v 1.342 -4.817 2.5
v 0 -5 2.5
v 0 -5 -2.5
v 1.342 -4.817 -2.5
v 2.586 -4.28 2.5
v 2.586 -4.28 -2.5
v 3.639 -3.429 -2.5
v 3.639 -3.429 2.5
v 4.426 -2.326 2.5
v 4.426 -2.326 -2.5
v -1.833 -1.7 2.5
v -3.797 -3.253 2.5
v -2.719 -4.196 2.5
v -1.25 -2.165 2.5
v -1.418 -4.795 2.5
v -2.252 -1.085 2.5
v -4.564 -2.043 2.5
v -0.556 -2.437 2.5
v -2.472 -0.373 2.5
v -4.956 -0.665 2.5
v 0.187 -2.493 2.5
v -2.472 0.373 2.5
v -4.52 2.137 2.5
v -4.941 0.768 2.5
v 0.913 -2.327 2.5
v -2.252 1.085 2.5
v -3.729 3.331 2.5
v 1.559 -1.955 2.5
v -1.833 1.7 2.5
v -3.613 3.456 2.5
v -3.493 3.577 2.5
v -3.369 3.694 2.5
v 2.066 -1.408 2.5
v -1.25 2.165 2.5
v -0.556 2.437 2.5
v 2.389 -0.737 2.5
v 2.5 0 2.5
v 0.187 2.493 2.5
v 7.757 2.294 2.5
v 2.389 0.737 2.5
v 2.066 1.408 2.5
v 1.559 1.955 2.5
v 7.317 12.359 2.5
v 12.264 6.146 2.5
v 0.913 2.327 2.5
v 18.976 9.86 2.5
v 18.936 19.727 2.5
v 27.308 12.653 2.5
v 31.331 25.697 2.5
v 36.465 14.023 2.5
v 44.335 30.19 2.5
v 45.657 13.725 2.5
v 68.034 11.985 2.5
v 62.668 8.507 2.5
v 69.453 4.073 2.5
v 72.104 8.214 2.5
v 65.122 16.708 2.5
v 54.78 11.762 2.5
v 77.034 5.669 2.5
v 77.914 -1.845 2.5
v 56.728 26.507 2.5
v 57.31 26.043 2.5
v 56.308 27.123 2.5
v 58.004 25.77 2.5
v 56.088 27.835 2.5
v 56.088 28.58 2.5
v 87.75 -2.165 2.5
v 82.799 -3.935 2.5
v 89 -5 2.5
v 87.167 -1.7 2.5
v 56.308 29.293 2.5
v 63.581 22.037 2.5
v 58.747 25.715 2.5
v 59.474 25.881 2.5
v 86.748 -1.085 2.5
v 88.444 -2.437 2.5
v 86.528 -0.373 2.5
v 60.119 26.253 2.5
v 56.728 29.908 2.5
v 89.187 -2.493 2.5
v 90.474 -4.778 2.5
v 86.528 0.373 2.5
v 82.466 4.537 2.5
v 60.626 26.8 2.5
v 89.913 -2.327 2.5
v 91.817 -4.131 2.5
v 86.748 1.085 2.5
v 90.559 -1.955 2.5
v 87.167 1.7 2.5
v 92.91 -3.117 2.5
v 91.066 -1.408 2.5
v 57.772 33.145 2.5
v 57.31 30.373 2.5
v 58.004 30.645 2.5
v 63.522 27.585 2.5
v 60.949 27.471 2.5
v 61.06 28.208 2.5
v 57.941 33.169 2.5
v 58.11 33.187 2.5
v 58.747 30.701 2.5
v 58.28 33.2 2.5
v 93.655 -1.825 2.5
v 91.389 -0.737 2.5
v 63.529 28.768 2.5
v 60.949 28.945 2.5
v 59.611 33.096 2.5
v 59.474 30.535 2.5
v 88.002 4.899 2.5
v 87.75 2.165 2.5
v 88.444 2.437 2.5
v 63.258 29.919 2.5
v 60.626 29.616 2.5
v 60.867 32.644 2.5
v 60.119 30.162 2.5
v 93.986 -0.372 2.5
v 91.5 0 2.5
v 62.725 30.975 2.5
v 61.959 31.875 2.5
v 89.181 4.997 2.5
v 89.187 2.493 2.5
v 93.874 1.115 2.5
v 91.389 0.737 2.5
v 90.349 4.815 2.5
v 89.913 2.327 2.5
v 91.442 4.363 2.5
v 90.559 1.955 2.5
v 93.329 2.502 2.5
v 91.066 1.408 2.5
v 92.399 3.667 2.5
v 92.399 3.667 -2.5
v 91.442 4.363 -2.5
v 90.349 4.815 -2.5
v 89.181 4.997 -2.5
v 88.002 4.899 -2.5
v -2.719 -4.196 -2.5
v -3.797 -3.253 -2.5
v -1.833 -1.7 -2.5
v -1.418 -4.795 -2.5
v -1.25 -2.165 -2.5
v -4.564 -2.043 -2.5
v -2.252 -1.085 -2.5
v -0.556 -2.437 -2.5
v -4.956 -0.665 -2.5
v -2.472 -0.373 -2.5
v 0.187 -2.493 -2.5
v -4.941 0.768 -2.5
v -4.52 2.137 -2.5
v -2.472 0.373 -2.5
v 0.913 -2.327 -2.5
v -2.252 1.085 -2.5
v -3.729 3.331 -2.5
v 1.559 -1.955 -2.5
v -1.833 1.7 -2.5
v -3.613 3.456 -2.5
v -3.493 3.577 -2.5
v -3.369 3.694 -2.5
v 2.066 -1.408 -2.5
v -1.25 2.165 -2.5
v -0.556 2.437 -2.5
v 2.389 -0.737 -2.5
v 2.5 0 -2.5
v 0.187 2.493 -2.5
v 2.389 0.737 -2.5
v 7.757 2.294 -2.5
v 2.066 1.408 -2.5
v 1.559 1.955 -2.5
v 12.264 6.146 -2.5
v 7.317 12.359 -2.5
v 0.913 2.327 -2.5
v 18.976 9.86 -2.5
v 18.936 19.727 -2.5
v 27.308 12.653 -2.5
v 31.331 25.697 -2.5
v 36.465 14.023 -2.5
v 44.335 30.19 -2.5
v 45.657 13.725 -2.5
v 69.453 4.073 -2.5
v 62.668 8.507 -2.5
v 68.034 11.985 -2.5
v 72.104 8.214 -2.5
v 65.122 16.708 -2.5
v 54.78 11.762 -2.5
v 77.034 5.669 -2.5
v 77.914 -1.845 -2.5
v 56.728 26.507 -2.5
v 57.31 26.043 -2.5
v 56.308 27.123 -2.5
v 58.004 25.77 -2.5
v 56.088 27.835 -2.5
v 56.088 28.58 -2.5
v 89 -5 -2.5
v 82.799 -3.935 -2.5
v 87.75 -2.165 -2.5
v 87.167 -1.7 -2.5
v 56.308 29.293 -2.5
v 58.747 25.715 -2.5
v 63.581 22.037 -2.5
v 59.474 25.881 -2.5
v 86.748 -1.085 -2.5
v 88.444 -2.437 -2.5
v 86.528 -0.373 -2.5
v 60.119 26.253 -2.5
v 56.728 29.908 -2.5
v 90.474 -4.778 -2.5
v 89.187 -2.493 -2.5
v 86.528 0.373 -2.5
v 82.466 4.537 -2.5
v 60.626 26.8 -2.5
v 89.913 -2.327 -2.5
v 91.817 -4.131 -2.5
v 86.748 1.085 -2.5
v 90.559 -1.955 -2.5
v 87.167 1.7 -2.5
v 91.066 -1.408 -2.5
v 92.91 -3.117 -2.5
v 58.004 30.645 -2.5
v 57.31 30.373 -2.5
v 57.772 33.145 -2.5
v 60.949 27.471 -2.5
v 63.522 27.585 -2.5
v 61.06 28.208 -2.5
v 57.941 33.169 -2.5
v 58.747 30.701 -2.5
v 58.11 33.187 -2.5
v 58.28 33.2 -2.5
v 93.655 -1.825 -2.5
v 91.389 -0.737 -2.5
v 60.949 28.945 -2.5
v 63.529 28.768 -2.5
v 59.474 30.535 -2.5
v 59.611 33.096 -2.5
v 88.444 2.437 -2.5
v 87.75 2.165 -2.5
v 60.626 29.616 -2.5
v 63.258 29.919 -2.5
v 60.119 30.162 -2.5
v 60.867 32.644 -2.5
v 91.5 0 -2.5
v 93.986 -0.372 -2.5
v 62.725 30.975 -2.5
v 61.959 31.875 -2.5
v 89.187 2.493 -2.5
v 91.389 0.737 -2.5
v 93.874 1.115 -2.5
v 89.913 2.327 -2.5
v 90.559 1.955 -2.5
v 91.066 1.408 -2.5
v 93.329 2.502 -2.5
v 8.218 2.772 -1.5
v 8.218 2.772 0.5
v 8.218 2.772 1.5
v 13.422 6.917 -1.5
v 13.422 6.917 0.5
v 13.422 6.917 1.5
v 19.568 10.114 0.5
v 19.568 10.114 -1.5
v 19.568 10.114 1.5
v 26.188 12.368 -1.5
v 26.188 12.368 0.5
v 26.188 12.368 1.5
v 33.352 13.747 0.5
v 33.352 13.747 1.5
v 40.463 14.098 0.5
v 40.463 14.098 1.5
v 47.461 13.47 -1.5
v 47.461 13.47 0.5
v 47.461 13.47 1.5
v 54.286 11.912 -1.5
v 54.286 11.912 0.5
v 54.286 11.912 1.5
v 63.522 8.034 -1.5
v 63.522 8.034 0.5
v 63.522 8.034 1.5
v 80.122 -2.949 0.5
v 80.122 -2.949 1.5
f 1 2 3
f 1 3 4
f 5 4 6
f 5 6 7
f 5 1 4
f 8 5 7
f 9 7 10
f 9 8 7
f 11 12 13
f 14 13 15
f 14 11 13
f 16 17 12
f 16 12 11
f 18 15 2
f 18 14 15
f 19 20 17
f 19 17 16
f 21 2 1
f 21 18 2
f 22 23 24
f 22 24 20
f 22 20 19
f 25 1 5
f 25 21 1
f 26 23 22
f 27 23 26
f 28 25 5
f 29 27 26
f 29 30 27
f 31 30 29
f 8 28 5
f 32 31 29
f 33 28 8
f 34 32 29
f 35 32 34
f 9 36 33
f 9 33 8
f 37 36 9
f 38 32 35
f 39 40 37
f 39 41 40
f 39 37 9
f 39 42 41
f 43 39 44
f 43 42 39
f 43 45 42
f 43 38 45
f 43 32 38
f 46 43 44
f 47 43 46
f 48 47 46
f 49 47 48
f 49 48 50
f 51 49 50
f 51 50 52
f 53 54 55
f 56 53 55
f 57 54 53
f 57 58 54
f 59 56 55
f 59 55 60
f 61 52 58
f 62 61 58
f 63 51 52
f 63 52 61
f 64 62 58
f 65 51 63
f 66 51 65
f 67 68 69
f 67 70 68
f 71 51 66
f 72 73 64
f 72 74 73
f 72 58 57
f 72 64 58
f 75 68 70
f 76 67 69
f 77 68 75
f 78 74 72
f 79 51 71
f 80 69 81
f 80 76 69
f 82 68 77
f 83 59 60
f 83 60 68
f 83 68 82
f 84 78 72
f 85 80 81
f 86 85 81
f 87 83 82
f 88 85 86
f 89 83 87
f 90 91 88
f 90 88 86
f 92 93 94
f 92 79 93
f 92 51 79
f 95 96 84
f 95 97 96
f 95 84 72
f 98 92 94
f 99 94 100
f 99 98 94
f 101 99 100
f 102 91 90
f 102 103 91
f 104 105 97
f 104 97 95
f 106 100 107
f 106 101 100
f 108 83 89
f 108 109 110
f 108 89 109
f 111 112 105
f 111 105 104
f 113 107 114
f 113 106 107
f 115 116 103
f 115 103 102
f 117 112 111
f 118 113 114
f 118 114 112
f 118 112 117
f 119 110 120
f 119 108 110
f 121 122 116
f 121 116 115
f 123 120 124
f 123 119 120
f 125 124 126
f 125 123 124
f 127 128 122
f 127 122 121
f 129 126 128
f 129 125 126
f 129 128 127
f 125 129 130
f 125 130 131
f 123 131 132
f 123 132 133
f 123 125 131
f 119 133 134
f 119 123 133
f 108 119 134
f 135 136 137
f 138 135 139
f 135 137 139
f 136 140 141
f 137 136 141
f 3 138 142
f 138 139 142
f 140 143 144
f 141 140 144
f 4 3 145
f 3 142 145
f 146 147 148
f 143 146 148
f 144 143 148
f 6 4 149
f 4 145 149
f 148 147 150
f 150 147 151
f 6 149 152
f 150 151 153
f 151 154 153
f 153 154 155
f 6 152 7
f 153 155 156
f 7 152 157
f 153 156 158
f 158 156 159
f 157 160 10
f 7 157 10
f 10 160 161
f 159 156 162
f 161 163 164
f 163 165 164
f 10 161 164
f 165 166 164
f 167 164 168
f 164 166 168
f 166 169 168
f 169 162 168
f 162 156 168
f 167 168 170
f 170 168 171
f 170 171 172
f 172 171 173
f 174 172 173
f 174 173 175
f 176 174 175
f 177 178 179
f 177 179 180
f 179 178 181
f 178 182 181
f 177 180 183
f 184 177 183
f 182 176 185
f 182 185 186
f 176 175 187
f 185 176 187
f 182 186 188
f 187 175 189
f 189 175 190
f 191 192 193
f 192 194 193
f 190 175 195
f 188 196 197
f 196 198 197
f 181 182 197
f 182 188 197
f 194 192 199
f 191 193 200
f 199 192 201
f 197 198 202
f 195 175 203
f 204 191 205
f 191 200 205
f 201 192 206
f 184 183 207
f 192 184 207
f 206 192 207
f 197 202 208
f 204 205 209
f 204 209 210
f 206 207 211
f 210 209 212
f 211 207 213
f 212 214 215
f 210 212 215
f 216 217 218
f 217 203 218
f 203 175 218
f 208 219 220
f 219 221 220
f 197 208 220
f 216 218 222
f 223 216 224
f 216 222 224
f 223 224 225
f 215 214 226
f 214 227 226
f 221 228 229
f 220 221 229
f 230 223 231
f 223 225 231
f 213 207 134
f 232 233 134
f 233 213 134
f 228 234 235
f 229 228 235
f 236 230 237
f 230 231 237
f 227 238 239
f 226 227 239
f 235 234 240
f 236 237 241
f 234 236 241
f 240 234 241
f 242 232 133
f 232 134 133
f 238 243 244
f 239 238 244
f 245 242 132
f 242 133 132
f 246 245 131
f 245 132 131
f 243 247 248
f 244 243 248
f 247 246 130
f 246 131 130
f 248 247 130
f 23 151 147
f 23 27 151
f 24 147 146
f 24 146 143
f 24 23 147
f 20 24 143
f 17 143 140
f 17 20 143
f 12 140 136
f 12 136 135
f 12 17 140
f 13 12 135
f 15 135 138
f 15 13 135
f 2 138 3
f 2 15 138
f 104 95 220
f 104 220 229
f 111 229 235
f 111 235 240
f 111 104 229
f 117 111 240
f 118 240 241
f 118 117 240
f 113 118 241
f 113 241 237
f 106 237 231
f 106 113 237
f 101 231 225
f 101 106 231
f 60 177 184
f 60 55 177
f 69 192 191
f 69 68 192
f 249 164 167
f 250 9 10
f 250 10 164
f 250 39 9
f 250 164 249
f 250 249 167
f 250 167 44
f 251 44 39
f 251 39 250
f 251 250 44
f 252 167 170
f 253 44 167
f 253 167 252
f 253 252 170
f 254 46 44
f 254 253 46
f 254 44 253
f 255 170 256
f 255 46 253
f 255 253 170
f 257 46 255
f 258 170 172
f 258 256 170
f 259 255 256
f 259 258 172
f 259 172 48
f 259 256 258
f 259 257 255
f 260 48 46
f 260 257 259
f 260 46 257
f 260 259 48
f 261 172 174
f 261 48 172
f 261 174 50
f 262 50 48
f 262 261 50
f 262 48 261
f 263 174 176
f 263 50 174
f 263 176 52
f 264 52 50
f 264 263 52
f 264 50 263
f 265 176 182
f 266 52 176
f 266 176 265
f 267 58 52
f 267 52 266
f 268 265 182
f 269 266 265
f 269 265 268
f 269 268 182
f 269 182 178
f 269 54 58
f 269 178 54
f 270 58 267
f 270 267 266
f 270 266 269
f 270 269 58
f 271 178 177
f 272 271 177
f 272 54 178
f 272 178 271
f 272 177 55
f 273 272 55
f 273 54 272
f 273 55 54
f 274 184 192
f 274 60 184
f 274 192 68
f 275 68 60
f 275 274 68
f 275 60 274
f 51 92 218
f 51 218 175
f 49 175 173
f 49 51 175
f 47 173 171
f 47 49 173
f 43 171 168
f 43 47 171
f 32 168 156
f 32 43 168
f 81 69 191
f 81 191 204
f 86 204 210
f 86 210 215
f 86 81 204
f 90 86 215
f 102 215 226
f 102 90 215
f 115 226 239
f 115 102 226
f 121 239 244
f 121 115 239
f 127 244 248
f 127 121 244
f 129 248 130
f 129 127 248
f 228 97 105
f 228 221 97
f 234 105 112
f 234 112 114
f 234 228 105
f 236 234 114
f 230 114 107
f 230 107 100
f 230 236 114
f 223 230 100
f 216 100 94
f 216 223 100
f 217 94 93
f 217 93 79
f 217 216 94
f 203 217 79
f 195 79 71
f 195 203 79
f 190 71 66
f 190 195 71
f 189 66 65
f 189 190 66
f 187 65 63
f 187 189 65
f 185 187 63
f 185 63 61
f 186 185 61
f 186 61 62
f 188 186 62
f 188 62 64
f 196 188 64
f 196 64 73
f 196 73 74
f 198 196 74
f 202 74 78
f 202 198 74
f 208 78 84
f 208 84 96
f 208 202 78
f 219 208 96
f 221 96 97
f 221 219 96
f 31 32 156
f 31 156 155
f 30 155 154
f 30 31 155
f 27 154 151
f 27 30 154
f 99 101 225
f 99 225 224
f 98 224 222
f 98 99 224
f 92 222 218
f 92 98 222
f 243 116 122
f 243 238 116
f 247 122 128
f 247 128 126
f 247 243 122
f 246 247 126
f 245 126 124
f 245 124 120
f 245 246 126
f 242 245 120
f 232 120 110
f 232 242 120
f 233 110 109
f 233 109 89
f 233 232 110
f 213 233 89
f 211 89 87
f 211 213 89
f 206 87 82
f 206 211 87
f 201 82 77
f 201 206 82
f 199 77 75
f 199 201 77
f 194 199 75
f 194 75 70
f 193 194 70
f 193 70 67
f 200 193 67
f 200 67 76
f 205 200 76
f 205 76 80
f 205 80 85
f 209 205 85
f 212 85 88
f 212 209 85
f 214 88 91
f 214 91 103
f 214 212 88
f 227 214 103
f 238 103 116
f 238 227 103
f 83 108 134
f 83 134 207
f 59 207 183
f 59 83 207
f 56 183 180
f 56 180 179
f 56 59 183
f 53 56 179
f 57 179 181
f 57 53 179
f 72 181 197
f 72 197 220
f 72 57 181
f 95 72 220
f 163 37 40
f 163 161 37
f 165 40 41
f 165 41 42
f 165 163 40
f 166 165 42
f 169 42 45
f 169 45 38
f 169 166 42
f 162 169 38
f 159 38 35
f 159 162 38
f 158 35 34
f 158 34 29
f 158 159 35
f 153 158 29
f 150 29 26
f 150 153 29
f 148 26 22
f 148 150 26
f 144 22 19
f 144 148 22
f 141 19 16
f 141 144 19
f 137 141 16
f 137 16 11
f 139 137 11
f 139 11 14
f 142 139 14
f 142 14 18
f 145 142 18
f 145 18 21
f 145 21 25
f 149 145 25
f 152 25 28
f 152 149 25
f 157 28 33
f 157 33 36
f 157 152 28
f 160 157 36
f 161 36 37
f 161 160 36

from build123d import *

# Parameters (mm, degrees)
SKETCH_1_R          = 2.5
EXTRUDE_1_DEPTH     = 2.5
SKETCH_2_OUTSIDE_W  = 122.246
SKETCH_2_OUTSIDE_H  = 61.454
CUT_EXTRUDE_1_DEPTH = 5


with BuildPart() as part:
    # 草圖1 → 填料-伸長1 (new body, symmetric)
    with BuildSketch(Plane.XY):
        with BuildLine():
            Line((0, -5), (89, -5))
            ThreePointArc((89, -5), (93.65494965, -1.825224302), (92.398530891, 3.667422499))
            Line((92.398530891, 3.667422499), (61.958924149, 31.87522889))
            ThreePointArc((61.958924149, 31.87522889), (60.254323258, 32.912123681), (58.279993488, 33.199937797))
            ThreePointArc((58.279993488, 33.199937797), (24.304322989, 24.433991013), (-3.728789315, 3.331085445))
            ThreePointArc((-3.728789315, 3.331085445), (-4.563738995, -2.042617533), (0, -5))
        make_face()
        with Locations((89, 0)):
            Circle(SKETCH_1_R, mode=Mode.SUBTRACT)
        with Locations((58.560393258, 28.207806391)):
            Circle(SKETCH_1_R, mode=Mode.SUBTRACT)
        Circle(SKETCH_1_R, mode=Mode.SUBTRACT)
    extrude(amount=EXTRUDE_1_DEPTH, both=True)

    # 草圖2 outside → 除料-伸長1 (cut)
    with BuildSketch(Plane.XY.offset(2.5)):
        with Locations((44.5, 14.104)):
            Rectangle(SKETCH_2_OUTSIDE_W, SKETCH_2_OUTSIDE_H)
        with BuildLine():
            ThreePointArc((89, -5), (93.974802144, 0.501341826), (88.002369443, 4.899462549))
            ThreePointArc((88.002369443, 4.899462549), (69.941203596, 9.961169209), (63.521504981, 27.585415456))
            ThreePointArc((63.521504981, 27.585415456), (62.036094915, 31.802176711), (57.771858796, 33.145236229))
            ThreePointArc((57.771858796, 33.145236229), (25.047082101, 22.891997102), (-3.369271636, 3.694321134))
            ThreePointArc((-3.369271636, 3.694321134), (-3.0561059, -3.957299171), (4.426117807, -2.325829134))
            add(Edge.make_bspline(
                [(4.426117807, -2.325829134), (8.332752679, 5.108606147), (26.800732902, 15.21507614), (48.740337839, 14.473140614), (64.347418315, 8.195396514), (74.817720457, -0.231553234), (81.784825156, -4.537988126), (89, -5)],
                knots=[0, 0, 0, 0, 0.281768749, 0.583331101, 0.690814507, 0.820319315, 1, 1, 1, 1], degree=3))
        make_face(mode=Mode.SUBTRACT)
    extrude(amount=-CUT_EXTRUDE_1_DEPTH, mode=Mode.SUBTRACT)


solid = part.part
